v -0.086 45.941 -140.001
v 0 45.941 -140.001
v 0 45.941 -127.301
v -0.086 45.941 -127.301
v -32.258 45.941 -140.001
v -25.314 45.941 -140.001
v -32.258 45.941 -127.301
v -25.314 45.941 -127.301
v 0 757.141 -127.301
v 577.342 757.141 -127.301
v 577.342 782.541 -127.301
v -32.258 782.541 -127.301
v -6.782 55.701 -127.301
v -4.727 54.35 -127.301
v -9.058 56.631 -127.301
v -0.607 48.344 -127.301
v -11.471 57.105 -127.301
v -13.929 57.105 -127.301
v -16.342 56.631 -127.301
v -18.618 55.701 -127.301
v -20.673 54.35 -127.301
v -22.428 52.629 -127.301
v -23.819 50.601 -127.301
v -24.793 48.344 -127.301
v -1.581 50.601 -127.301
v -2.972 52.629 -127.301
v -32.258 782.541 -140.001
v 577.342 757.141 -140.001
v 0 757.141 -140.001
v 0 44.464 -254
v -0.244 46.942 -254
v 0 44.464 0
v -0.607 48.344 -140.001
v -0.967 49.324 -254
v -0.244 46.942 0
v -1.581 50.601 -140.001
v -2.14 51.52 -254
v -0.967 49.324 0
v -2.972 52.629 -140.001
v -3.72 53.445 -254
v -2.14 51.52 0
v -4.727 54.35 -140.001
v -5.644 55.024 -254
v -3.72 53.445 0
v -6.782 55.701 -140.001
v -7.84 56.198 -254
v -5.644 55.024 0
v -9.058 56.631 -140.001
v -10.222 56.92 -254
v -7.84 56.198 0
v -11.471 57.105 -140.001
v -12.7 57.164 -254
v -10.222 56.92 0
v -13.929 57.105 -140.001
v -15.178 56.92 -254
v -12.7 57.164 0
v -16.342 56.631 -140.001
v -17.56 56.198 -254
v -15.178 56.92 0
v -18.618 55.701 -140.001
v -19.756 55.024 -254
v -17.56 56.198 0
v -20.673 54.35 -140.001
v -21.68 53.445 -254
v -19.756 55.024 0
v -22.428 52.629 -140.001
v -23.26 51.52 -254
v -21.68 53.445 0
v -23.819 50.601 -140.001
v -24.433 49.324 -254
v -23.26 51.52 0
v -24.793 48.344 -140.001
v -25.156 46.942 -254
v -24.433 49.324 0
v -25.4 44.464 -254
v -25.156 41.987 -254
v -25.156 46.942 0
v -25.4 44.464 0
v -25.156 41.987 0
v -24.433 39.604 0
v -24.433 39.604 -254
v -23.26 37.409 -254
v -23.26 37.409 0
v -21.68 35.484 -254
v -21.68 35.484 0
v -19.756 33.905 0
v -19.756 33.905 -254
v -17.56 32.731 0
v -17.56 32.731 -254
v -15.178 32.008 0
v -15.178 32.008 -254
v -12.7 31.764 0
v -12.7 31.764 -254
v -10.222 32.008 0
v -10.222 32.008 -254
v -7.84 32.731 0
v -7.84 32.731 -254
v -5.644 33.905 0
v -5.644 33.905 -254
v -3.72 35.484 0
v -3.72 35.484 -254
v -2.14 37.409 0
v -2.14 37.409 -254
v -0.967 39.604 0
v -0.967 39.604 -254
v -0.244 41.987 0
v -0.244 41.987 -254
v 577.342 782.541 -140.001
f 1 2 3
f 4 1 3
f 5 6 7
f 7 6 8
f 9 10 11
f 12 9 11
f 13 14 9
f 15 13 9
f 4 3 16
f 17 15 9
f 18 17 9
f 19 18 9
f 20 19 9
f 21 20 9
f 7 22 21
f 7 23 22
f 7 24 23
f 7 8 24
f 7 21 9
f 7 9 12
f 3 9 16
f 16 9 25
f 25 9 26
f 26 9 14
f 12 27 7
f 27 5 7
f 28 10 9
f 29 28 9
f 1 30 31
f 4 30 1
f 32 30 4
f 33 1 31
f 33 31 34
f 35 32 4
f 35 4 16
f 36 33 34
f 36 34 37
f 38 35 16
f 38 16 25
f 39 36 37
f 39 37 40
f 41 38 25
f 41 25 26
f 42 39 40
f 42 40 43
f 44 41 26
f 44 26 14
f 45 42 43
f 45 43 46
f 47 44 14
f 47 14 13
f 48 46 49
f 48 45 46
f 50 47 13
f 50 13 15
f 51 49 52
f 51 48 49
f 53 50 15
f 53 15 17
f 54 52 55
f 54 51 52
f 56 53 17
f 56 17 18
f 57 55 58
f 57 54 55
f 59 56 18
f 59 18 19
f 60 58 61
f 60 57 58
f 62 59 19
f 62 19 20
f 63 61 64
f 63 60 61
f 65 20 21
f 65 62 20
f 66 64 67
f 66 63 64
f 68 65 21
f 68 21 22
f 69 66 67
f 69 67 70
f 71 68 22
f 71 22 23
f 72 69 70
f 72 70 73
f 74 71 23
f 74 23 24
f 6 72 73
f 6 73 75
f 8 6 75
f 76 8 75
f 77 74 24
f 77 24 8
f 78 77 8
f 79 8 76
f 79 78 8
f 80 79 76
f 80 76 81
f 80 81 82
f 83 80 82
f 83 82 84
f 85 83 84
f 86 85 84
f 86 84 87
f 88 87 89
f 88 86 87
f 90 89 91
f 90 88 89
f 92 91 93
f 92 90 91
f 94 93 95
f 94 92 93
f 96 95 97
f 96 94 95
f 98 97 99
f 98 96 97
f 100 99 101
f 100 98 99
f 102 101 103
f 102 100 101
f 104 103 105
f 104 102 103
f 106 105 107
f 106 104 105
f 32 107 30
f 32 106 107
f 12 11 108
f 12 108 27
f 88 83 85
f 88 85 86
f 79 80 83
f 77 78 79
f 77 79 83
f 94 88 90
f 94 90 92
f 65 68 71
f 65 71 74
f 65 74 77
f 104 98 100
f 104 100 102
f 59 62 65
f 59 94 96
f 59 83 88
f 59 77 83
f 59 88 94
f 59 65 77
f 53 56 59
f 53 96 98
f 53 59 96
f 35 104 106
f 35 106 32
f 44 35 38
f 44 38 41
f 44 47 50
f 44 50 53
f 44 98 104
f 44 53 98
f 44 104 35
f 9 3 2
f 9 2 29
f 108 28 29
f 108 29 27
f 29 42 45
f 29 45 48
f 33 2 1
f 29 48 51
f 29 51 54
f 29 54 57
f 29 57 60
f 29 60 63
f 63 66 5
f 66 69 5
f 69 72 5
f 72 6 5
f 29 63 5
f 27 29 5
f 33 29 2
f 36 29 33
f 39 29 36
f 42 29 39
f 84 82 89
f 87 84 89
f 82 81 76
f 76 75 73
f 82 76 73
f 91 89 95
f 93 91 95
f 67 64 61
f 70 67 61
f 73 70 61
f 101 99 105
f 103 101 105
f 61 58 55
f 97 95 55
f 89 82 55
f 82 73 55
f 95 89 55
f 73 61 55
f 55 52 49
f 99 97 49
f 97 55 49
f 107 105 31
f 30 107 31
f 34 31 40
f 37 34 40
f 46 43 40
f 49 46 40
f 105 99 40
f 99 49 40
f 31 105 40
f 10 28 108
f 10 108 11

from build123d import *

# Parameters (mm, degrees)
F0_R     = 12.7
F1_DEPTH = 254
F2_W     = 711.2
F2_H     = 12.7
F3_DEPTH = 32.258
F4_W     = 609.6
F4_H     = 12.7
F5_DEPTH = 25.4


with BuildPart() as f1:
    # F0 (on Top) → F1 (new body)
    with BuildSketch(Plane.XY):
        with Locations((-12.7, 44.464361)):
            Circle(F0_R)
    extrude(amount=-F1_DEPTH)

    # F2 (on Right) → F3 (join)
    with BuildSketch(Plane.YZ):
        with Locations((401.540584, -133.65126)):
            Rectangle(F2_W, F2_H)
    extrude(amount=-F3_DEPTH)

    # F4 (on face) → F5 (join)
    with BuildSketch(Plane(origin=(0, 757.140584, 0), x_dir=(-1, 0, 0), z_dir=(0, 1, 0))):
        with Locations((-272.542, -133.65126)):
            Rectangle(F4_W, F4_H)
    extrude(amount=F5_DEPTH)


solid = f1.part
